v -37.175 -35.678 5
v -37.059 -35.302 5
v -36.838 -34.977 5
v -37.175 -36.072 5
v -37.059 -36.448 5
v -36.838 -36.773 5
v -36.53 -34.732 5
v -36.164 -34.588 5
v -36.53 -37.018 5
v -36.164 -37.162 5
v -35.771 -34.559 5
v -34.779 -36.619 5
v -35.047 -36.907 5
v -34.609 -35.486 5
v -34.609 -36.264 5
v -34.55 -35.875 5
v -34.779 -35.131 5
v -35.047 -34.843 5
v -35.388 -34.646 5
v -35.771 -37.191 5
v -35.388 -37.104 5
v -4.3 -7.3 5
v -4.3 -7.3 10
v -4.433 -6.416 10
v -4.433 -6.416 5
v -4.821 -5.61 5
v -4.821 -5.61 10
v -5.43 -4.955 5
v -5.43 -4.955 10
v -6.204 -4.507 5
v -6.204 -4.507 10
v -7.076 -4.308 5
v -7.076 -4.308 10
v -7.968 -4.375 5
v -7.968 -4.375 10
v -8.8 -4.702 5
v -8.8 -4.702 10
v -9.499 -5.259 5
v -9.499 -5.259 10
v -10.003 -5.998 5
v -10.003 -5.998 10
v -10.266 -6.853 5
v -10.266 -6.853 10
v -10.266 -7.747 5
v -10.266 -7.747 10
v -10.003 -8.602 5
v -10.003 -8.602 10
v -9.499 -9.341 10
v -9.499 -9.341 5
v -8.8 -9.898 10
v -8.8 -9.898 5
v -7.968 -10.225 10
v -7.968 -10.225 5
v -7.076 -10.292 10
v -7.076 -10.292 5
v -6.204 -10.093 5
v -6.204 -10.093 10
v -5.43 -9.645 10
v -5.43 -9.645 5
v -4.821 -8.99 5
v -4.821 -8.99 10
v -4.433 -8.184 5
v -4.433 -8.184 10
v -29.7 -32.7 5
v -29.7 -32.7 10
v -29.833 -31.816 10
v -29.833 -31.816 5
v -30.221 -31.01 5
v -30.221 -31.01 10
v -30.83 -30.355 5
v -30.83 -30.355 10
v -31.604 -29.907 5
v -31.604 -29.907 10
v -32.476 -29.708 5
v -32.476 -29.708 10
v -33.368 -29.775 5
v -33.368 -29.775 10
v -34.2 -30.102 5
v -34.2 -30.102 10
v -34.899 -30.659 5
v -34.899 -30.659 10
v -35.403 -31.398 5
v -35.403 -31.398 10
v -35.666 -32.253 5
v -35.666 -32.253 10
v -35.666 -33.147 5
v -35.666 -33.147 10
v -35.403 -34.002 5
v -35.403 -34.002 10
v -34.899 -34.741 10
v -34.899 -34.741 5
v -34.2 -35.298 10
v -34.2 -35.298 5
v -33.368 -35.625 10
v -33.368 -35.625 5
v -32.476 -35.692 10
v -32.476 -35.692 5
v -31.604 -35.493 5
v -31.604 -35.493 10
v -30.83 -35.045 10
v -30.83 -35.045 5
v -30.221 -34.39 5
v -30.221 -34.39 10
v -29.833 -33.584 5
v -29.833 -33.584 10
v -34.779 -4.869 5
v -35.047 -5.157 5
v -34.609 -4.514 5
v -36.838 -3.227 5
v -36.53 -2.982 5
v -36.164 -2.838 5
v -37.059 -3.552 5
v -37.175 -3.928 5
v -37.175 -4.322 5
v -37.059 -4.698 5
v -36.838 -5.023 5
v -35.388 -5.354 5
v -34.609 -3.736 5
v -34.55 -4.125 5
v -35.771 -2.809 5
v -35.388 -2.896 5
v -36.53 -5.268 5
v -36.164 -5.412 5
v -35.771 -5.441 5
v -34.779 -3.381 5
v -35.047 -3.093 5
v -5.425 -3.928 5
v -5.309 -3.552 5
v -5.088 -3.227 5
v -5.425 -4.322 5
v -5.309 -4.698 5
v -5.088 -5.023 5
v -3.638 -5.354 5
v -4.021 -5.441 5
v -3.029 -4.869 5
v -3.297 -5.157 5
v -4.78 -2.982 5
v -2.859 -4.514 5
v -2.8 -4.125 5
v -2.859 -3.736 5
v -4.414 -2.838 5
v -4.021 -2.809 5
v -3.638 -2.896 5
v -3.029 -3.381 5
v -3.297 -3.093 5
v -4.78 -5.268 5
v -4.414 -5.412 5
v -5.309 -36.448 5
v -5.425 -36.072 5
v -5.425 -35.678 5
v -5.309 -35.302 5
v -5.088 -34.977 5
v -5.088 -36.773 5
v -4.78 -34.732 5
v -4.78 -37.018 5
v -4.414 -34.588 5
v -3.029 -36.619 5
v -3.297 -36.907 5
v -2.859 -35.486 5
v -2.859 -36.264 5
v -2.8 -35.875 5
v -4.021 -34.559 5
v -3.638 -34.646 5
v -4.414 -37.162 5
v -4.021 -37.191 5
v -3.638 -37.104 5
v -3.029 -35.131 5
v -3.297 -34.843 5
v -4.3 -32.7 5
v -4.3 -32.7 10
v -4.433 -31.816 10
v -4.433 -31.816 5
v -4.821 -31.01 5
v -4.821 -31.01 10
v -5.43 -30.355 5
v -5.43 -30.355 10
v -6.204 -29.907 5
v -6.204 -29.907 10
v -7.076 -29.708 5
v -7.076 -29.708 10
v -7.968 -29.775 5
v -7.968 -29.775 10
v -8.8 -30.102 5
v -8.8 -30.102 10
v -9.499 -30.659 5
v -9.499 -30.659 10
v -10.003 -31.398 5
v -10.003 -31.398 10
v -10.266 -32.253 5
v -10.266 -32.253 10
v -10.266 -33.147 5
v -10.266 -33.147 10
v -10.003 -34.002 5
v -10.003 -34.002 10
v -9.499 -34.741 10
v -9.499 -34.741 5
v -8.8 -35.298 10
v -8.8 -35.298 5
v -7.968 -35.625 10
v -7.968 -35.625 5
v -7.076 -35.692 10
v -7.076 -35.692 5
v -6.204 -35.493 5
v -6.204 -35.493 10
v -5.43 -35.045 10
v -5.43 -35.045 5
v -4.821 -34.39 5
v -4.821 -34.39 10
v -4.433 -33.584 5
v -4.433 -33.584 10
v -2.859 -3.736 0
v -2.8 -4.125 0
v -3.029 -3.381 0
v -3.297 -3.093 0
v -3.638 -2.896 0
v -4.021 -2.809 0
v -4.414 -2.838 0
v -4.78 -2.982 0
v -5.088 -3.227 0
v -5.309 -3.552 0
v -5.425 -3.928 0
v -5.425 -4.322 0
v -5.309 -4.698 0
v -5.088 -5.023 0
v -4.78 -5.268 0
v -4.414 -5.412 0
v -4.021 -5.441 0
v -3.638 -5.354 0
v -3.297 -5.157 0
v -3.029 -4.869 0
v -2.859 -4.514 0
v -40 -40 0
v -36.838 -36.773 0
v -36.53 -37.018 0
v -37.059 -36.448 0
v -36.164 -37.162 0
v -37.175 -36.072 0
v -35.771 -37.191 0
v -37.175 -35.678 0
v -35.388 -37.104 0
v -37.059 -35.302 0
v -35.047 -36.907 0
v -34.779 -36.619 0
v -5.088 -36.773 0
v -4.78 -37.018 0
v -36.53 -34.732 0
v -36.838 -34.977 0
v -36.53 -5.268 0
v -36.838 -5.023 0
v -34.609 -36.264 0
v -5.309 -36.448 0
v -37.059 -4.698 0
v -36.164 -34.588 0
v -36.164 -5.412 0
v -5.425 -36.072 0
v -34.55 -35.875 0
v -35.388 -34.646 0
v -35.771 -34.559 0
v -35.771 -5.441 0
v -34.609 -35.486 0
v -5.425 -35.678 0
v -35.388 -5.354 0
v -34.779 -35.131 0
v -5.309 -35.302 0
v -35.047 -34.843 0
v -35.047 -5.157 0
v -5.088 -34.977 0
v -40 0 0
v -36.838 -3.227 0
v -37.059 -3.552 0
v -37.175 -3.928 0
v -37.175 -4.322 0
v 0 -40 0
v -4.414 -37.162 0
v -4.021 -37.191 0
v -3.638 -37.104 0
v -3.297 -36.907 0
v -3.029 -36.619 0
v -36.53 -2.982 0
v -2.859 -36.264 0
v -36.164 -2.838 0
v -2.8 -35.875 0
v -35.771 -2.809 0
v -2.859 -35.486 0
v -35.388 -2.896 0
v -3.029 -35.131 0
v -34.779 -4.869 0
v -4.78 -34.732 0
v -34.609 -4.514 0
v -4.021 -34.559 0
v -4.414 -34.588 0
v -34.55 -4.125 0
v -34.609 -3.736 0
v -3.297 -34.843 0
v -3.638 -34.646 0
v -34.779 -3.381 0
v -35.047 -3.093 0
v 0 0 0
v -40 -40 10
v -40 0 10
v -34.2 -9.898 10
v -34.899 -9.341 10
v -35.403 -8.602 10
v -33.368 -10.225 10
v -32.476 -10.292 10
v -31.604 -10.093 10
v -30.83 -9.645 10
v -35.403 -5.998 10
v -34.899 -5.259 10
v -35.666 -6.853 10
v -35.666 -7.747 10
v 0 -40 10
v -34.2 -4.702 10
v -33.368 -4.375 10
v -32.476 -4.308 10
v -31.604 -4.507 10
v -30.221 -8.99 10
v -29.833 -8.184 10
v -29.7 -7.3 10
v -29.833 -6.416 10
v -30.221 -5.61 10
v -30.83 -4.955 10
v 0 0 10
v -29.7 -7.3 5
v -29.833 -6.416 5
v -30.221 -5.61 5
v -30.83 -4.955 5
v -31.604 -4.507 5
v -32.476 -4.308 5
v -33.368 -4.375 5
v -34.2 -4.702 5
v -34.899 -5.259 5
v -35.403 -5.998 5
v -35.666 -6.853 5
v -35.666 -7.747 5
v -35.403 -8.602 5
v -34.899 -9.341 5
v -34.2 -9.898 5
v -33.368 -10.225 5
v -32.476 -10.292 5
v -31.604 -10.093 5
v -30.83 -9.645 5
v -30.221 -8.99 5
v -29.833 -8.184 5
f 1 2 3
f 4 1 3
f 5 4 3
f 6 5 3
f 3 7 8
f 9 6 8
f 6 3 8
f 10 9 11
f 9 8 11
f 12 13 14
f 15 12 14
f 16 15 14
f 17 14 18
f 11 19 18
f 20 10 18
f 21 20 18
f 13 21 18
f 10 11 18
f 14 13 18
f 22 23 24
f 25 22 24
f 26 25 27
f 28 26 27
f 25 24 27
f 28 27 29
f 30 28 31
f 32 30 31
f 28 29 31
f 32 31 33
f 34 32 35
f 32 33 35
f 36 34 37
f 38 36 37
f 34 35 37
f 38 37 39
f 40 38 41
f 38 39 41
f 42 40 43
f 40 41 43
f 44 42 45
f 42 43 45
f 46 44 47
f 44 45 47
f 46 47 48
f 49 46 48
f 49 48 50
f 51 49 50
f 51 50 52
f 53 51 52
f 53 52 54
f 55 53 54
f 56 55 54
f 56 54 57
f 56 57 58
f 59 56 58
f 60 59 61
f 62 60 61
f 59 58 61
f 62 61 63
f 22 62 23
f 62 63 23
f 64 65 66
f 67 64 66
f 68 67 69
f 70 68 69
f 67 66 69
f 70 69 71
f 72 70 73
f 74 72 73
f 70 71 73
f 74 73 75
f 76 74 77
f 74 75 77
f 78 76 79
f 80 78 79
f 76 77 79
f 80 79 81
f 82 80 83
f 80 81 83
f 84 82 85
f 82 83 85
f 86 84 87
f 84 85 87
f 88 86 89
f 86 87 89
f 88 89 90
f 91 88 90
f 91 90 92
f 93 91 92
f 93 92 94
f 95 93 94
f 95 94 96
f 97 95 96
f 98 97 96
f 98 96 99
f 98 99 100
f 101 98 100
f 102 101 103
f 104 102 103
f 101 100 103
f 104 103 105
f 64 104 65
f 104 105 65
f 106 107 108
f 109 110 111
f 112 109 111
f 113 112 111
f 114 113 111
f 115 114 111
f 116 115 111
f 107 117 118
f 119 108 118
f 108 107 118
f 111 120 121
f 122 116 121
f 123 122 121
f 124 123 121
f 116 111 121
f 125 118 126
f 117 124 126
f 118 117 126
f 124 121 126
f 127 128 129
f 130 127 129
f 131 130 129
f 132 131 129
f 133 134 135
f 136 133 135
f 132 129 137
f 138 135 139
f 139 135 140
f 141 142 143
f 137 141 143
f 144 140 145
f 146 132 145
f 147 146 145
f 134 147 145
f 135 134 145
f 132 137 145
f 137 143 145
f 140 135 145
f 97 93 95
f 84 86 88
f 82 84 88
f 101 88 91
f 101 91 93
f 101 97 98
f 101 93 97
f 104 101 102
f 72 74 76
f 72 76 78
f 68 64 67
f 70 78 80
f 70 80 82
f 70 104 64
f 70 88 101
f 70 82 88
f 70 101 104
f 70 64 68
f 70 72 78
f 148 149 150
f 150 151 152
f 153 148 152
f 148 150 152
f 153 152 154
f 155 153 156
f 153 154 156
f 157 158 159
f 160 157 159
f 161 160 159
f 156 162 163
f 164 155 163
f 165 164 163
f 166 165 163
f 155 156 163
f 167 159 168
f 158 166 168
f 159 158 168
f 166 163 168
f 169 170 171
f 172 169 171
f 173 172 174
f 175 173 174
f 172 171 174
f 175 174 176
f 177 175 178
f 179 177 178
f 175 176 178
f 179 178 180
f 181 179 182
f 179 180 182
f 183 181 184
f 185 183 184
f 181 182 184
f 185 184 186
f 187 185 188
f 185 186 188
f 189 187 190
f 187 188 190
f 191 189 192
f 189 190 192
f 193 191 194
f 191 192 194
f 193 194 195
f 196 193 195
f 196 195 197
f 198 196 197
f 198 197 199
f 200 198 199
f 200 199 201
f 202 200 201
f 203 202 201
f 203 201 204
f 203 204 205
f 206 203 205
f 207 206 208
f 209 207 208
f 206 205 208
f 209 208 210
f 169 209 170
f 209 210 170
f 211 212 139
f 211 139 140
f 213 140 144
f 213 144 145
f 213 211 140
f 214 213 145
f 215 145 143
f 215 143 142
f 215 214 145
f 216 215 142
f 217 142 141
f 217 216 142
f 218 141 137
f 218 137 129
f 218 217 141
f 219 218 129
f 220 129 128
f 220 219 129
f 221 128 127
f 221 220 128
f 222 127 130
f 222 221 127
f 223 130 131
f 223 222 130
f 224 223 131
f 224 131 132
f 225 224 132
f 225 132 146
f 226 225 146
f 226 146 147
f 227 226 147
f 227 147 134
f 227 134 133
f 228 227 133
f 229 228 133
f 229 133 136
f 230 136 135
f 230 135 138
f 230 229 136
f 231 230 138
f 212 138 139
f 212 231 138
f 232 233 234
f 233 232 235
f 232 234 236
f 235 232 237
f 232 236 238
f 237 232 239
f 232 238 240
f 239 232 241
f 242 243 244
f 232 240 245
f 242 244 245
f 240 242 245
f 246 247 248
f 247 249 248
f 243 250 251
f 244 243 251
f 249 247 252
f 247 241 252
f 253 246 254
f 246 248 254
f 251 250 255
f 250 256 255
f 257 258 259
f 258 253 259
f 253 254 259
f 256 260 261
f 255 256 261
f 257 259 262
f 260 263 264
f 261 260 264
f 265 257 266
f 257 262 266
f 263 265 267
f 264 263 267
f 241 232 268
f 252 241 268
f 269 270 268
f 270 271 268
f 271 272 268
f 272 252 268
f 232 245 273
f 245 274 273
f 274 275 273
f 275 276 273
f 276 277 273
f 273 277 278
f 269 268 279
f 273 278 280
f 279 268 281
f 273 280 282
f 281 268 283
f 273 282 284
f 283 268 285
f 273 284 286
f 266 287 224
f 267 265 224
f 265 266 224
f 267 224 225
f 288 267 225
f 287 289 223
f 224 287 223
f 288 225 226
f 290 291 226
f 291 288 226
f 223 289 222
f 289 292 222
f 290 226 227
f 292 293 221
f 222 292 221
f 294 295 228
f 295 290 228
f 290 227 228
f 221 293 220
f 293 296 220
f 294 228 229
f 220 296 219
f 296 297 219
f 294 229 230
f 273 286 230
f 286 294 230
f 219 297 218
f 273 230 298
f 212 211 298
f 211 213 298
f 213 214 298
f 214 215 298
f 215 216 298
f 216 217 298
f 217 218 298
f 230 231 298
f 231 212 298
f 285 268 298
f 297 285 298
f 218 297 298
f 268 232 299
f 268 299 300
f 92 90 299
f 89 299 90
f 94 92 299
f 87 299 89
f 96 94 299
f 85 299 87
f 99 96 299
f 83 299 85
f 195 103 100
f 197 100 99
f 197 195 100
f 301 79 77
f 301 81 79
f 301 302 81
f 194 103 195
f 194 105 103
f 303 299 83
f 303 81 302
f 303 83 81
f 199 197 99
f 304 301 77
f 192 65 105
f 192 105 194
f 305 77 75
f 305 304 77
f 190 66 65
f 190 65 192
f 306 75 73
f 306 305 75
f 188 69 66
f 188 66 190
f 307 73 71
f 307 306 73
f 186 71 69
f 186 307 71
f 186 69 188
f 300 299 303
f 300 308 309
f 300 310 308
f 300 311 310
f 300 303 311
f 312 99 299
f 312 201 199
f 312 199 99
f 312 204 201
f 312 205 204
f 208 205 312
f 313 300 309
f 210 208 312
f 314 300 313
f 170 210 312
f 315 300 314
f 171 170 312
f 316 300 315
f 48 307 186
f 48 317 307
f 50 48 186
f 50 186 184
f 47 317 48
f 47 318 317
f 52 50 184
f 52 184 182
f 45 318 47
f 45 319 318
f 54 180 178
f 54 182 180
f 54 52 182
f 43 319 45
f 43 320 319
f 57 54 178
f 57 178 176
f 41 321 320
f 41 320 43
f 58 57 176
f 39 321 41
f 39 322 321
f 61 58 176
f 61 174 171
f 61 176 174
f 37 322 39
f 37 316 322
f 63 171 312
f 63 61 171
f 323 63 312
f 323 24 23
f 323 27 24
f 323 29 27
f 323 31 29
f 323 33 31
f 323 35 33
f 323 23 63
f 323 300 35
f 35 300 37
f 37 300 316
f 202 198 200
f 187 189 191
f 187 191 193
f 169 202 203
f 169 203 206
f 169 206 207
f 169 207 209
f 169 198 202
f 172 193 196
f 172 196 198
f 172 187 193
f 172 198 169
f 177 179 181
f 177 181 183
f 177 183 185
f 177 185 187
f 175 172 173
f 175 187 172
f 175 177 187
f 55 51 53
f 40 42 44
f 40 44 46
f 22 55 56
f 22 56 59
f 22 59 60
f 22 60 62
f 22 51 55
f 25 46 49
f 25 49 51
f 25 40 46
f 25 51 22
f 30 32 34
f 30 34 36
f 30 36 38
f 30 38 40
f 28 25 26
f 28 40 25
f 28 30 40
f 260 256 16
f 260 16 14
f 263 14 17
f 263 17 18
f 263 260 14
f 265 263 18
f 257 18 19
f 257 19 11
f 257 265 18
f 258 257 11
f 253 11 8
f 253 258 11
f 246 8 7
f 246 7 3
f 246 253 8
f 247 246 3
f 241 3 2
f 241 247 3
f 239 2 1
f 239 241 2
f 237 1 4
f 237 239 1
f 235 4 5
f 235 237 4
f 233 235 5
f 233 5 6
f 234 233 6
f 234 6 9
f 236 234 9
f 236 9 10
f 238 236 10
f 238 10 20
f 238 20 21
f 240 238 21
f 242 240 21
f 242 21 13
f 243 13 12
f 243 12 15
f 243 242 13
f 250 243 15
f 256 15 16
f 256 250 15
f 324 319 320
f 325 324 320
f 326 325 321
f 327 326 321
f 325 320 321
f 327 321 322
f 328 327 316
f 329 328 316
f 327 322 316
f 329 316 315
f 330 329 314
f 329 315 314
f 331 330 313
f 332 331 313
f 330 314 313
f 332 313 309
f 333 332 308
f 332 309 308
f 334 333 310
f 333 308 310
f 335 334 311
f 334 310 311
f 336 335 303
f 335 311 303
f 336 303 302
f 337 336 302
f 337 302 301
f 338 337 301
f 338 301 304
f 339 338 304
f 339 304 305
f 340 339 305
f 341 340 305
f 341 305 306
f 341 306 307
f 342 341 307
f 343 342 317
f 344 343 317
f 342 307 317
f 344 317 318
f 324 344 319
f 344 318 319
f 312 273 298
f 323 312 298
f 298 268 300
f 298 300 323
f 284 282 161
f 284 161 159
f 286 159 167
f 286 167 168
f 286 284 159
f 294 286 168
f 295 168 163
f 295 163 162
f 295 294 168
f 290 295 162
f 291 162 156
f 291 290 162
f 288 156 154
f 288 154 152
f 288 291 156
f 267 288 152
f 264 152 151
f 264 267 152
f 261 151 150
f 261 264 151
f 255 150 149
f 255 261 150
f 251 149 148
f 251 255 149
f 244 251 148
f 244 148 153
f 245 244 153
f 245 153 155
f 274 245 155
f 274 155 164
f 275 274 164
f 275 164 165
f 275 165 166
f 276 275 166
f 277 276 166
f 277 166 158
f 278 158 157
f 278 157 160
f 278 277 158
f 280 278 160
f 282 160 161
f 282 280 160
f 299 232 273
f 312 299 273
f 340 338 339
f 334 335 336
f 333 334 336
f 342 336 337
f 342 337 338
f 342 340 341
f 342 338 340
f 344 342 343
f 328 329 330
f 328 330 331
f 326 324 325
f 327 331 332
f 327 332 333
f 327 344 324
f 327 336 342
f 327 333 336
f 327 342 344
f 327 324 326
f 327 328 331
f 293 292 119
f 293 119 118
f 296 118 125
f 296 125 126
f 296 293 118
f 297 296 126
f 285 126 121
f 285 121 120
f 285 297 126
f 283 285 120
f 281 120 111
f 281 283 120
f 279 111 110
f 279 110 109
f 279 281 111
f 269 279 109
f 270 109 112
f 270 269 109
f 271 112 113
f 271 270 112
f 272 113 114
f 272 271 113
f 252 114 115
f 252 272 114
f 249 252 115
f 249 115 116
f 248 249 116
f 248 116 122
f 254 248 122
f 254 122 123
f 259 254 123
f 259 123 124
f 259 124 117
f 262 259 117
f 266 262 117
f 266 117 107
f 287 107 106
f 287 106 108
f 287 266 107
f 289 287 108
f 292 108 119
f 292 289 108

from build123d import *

# Parameters (mm, degrees)
SKETCH1_W           = 40
SKETCH1_H           = 40
BOSS_EXTRUDE1_DEPTH = 10
SKETCH2_R           = 1.32
CUT_EXTRUDE2_DEPTH  = 5
SKETCH5_R           = 3
CUT_EXTRUDE3_DEPTH  = 5


with BuildPart() as part:
    # Sketch1 → Boss-Extrude1 (new body)
    with BuildSketch(Plane.XY):
        with Locations((-20, -20)):
            Rectangle(SKETCH1_W, SKETCH1_H)
    extrude(amount=BOSS_EXTRUDE1_DEPTH)

    # Sketch2 → Cut-Extrude2 (cut)
    with BuildSketch(Plane.XY):
        with Locations((-35.87, -35.875)):
            Circle(SKETCH2_R)
        with Locations((-4.12, -35.875)):
            Circle(SKETCH2_R)
        with Locations((-4.12, -4.125)):
            Circle(SKETCH2_R)
        with Locations((-35.87, -4.125)):
            Circle(SKETCH2_R)
    extrude(amount=CUT_EXTRUDE2_DEPTH, mode=Mode.SUBTRACT)

    # Sketch5 → Cut-Extrude3 (cut)
    with BuildSketch(Plane.XY.offset(10)):
        with Locations((-32.7, -7.3)):
            Circle(SKETCH5_R)
        with Locations((-7.3, -7.3)):
            Circle(SKETCH5_R)
        with Locations((-7.3, -32.7)):
            Circle(SKETCH5_R)
        with Locations((-32.7, -32.7)):
            Circle(SKETCH5_R)
    extrude(amount=-CUT_EXTRUDE3_DEPTH, mode=Mode.SUBTRACT)


solid = part.part
